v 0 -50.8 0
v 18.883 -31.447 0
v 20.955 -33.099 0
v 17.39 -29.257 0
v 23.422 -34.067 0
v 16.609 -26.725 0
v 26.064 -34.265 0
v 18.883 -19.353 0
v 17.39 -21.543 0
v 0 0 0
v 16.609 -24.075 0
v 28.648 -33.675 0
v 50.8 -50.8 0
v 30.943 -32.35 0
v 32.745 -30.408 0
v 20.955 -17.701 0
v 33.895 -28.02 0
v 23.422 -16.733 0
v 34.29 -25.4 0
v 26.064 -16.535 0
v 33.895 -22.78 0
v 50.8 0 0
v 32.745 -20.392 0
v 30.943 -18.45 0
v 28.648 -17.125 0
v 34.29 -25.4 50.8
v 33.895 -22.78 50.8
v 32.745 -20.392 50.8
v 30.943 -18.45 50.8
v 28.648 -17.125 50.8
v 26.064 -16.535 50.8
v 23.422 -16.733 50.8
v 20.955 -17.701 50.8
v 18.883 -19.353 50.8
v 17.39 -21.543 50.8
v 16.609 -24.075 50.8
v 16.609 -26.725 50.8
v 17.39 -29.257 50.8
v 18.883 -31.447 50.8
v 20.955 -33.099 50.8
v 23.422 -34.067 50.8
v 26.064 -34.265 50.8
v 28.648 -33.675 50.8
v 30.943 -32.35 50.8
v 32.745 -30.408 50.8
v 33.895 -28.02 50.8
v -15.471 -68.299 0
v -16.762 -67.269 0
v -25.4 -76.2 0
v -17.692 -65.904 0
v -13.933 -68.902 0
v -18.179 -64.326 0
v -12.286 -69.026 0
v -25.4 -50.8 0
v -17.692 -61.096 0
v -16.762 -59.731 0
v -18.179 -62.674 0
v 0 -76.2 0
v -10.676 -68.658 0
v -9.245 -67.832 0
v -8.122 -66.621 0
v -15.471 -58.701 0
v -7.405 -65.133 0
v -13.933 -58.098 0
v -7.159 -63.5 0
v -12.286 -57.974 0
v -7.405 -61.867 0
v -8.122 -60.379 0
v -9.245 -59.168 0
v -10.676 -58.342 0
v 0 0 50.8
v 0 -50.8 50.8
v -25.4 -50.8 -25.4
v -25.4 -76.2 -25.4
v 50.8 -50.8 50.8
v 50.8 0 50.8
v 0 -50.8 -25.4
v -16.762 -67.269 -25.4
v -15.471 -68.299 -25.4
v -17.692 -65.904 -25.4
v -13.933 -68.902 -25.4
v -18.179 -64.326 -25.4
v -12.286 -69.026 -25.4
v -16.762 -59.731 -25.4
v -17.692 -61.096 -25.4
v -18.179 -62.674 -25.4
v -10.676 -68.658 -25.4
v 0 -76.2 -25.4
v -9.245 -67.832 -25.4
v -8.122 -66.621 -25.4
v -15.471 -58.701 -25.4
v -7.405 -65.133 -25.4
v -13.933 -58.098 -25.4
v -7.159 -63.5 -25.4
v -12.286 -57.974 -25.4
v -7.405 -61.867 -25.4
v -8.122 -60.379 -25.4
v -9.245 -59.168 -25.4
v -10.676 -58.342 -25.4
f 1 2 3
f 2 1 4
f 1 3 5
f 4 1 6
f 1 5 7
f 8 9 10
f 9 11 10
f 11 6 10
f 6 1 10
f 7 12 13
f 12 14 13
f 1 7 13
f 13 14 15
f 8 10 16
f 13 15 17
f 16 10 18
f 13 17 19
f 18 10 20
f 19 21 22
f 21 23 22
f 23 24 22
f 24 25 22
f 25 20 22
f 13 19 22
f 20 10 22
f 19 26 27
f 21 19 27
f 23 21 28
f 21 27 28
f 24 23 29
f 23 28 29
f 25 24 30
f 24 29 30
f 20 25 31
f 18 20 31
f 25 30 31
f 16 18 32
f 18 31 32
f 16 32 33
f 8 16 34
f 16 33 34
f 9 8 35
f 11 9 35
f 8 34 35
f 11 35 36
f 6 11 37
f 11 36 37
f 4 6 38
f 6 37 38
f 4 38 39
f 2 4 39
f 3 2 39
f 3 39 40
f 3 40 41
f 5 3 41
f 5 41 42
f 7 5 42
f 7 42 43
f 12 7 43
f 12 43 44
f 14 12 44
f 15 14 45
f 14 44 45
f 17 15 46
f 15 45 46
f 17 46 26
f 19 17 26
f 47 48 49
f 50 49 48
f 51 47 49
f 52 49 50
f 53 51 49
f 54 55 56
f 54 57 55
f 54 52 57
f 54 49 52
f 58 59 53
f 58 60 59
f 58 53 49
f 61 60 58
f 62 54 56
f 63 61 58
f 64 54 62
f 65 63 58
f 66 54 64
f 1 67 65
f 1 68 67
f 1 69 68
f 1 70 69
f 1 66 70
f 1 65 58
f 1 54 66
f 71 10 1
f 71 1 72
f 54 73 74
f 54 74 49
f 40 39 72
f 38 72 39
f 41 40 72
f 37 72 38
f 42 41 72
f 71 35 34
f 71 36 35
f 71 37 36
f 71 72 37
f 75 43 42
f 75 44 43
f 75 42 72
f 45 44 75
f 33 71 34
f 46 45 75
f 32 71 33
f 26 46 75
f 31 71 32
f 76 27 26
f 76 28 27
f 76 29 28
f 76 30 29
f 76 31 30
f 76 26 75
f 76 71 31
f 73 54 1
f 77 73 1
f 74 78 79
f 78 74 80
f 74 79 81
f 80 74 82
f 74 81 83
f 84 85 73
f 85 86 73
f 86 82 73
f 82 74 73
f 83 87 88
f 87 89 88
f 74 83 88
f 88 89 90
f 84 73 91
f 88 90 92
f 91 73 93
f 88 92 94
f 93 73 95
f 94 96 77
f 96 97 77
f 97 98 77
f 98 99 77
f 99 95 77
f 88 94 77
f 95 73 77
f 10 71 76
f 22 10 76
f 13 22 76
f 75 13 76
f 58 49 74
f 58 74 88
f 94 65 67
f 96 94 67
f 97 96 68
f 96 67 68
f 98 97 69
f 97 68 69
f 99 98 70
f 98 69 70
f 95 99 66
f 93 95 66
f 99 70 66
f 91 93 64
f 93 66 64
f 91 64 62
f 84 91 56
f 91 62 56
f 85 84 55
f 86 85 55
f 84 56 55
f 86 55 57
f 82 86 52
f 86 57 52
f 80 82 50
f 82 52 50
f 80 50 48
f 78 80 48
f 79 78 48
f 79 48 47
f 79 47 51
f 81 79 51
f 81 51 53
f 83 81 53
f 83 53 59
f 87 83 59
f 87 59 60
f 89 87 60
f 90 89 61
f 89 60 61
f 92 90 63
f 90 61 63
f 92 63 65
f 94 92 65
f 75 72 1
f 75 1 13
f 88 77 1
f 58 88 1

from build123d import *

# Parameters (mm, degrees)
F0_W     = 50.8
F0_H     = 50.8
F1_DEPTH = 50.8
F2_W     = 25.4
F2_H     = 25.4
F3_DEPTH = 25.4
F4_R     = 8.89
F5_DEPTH = 50.8
F6_R     = 5.54117
F7_DEPTH = 25.4


with BuildPart() as f1:
    # F0 (on Front) → F1 (new body)
    with BuildSketch(Plane.XZ):
        with Locations((25.4, 25.4)):
            Rectangle(F0_W, F0_H)
    extrude(amount=F1_DEPTH)

    # F4 (on face) → F5 (cut)
    with BuildSketch(Plane.XY.offset(50.8)):
        with Locations((25.4, -25.4)):
            Circle(F4_R)
    extrude(amount=-F5_DEPTH, mode=Mode.SUBTRACT)


with BuildPart() as f3:
    # F2 (on face) → F3 (new body)
    with BuildSketch(Plane.XZ.offset(50.8)):
        with Locations((-12.7, -12.7)):
            Rectangle(F2_W, F2_H)
    extrude(amount=F3_DEPTH)

    # F6 (on face) → F7 (cut)
    with BuildSketch(Plane.XY):
        with Locations((-12.7, -63.5)):
            Circle(F6_R)
    extrude(amount=-F7_DEPTH, mode=Mode.SUBTRACT)


solid = Compound([f1.part, f3.part])
